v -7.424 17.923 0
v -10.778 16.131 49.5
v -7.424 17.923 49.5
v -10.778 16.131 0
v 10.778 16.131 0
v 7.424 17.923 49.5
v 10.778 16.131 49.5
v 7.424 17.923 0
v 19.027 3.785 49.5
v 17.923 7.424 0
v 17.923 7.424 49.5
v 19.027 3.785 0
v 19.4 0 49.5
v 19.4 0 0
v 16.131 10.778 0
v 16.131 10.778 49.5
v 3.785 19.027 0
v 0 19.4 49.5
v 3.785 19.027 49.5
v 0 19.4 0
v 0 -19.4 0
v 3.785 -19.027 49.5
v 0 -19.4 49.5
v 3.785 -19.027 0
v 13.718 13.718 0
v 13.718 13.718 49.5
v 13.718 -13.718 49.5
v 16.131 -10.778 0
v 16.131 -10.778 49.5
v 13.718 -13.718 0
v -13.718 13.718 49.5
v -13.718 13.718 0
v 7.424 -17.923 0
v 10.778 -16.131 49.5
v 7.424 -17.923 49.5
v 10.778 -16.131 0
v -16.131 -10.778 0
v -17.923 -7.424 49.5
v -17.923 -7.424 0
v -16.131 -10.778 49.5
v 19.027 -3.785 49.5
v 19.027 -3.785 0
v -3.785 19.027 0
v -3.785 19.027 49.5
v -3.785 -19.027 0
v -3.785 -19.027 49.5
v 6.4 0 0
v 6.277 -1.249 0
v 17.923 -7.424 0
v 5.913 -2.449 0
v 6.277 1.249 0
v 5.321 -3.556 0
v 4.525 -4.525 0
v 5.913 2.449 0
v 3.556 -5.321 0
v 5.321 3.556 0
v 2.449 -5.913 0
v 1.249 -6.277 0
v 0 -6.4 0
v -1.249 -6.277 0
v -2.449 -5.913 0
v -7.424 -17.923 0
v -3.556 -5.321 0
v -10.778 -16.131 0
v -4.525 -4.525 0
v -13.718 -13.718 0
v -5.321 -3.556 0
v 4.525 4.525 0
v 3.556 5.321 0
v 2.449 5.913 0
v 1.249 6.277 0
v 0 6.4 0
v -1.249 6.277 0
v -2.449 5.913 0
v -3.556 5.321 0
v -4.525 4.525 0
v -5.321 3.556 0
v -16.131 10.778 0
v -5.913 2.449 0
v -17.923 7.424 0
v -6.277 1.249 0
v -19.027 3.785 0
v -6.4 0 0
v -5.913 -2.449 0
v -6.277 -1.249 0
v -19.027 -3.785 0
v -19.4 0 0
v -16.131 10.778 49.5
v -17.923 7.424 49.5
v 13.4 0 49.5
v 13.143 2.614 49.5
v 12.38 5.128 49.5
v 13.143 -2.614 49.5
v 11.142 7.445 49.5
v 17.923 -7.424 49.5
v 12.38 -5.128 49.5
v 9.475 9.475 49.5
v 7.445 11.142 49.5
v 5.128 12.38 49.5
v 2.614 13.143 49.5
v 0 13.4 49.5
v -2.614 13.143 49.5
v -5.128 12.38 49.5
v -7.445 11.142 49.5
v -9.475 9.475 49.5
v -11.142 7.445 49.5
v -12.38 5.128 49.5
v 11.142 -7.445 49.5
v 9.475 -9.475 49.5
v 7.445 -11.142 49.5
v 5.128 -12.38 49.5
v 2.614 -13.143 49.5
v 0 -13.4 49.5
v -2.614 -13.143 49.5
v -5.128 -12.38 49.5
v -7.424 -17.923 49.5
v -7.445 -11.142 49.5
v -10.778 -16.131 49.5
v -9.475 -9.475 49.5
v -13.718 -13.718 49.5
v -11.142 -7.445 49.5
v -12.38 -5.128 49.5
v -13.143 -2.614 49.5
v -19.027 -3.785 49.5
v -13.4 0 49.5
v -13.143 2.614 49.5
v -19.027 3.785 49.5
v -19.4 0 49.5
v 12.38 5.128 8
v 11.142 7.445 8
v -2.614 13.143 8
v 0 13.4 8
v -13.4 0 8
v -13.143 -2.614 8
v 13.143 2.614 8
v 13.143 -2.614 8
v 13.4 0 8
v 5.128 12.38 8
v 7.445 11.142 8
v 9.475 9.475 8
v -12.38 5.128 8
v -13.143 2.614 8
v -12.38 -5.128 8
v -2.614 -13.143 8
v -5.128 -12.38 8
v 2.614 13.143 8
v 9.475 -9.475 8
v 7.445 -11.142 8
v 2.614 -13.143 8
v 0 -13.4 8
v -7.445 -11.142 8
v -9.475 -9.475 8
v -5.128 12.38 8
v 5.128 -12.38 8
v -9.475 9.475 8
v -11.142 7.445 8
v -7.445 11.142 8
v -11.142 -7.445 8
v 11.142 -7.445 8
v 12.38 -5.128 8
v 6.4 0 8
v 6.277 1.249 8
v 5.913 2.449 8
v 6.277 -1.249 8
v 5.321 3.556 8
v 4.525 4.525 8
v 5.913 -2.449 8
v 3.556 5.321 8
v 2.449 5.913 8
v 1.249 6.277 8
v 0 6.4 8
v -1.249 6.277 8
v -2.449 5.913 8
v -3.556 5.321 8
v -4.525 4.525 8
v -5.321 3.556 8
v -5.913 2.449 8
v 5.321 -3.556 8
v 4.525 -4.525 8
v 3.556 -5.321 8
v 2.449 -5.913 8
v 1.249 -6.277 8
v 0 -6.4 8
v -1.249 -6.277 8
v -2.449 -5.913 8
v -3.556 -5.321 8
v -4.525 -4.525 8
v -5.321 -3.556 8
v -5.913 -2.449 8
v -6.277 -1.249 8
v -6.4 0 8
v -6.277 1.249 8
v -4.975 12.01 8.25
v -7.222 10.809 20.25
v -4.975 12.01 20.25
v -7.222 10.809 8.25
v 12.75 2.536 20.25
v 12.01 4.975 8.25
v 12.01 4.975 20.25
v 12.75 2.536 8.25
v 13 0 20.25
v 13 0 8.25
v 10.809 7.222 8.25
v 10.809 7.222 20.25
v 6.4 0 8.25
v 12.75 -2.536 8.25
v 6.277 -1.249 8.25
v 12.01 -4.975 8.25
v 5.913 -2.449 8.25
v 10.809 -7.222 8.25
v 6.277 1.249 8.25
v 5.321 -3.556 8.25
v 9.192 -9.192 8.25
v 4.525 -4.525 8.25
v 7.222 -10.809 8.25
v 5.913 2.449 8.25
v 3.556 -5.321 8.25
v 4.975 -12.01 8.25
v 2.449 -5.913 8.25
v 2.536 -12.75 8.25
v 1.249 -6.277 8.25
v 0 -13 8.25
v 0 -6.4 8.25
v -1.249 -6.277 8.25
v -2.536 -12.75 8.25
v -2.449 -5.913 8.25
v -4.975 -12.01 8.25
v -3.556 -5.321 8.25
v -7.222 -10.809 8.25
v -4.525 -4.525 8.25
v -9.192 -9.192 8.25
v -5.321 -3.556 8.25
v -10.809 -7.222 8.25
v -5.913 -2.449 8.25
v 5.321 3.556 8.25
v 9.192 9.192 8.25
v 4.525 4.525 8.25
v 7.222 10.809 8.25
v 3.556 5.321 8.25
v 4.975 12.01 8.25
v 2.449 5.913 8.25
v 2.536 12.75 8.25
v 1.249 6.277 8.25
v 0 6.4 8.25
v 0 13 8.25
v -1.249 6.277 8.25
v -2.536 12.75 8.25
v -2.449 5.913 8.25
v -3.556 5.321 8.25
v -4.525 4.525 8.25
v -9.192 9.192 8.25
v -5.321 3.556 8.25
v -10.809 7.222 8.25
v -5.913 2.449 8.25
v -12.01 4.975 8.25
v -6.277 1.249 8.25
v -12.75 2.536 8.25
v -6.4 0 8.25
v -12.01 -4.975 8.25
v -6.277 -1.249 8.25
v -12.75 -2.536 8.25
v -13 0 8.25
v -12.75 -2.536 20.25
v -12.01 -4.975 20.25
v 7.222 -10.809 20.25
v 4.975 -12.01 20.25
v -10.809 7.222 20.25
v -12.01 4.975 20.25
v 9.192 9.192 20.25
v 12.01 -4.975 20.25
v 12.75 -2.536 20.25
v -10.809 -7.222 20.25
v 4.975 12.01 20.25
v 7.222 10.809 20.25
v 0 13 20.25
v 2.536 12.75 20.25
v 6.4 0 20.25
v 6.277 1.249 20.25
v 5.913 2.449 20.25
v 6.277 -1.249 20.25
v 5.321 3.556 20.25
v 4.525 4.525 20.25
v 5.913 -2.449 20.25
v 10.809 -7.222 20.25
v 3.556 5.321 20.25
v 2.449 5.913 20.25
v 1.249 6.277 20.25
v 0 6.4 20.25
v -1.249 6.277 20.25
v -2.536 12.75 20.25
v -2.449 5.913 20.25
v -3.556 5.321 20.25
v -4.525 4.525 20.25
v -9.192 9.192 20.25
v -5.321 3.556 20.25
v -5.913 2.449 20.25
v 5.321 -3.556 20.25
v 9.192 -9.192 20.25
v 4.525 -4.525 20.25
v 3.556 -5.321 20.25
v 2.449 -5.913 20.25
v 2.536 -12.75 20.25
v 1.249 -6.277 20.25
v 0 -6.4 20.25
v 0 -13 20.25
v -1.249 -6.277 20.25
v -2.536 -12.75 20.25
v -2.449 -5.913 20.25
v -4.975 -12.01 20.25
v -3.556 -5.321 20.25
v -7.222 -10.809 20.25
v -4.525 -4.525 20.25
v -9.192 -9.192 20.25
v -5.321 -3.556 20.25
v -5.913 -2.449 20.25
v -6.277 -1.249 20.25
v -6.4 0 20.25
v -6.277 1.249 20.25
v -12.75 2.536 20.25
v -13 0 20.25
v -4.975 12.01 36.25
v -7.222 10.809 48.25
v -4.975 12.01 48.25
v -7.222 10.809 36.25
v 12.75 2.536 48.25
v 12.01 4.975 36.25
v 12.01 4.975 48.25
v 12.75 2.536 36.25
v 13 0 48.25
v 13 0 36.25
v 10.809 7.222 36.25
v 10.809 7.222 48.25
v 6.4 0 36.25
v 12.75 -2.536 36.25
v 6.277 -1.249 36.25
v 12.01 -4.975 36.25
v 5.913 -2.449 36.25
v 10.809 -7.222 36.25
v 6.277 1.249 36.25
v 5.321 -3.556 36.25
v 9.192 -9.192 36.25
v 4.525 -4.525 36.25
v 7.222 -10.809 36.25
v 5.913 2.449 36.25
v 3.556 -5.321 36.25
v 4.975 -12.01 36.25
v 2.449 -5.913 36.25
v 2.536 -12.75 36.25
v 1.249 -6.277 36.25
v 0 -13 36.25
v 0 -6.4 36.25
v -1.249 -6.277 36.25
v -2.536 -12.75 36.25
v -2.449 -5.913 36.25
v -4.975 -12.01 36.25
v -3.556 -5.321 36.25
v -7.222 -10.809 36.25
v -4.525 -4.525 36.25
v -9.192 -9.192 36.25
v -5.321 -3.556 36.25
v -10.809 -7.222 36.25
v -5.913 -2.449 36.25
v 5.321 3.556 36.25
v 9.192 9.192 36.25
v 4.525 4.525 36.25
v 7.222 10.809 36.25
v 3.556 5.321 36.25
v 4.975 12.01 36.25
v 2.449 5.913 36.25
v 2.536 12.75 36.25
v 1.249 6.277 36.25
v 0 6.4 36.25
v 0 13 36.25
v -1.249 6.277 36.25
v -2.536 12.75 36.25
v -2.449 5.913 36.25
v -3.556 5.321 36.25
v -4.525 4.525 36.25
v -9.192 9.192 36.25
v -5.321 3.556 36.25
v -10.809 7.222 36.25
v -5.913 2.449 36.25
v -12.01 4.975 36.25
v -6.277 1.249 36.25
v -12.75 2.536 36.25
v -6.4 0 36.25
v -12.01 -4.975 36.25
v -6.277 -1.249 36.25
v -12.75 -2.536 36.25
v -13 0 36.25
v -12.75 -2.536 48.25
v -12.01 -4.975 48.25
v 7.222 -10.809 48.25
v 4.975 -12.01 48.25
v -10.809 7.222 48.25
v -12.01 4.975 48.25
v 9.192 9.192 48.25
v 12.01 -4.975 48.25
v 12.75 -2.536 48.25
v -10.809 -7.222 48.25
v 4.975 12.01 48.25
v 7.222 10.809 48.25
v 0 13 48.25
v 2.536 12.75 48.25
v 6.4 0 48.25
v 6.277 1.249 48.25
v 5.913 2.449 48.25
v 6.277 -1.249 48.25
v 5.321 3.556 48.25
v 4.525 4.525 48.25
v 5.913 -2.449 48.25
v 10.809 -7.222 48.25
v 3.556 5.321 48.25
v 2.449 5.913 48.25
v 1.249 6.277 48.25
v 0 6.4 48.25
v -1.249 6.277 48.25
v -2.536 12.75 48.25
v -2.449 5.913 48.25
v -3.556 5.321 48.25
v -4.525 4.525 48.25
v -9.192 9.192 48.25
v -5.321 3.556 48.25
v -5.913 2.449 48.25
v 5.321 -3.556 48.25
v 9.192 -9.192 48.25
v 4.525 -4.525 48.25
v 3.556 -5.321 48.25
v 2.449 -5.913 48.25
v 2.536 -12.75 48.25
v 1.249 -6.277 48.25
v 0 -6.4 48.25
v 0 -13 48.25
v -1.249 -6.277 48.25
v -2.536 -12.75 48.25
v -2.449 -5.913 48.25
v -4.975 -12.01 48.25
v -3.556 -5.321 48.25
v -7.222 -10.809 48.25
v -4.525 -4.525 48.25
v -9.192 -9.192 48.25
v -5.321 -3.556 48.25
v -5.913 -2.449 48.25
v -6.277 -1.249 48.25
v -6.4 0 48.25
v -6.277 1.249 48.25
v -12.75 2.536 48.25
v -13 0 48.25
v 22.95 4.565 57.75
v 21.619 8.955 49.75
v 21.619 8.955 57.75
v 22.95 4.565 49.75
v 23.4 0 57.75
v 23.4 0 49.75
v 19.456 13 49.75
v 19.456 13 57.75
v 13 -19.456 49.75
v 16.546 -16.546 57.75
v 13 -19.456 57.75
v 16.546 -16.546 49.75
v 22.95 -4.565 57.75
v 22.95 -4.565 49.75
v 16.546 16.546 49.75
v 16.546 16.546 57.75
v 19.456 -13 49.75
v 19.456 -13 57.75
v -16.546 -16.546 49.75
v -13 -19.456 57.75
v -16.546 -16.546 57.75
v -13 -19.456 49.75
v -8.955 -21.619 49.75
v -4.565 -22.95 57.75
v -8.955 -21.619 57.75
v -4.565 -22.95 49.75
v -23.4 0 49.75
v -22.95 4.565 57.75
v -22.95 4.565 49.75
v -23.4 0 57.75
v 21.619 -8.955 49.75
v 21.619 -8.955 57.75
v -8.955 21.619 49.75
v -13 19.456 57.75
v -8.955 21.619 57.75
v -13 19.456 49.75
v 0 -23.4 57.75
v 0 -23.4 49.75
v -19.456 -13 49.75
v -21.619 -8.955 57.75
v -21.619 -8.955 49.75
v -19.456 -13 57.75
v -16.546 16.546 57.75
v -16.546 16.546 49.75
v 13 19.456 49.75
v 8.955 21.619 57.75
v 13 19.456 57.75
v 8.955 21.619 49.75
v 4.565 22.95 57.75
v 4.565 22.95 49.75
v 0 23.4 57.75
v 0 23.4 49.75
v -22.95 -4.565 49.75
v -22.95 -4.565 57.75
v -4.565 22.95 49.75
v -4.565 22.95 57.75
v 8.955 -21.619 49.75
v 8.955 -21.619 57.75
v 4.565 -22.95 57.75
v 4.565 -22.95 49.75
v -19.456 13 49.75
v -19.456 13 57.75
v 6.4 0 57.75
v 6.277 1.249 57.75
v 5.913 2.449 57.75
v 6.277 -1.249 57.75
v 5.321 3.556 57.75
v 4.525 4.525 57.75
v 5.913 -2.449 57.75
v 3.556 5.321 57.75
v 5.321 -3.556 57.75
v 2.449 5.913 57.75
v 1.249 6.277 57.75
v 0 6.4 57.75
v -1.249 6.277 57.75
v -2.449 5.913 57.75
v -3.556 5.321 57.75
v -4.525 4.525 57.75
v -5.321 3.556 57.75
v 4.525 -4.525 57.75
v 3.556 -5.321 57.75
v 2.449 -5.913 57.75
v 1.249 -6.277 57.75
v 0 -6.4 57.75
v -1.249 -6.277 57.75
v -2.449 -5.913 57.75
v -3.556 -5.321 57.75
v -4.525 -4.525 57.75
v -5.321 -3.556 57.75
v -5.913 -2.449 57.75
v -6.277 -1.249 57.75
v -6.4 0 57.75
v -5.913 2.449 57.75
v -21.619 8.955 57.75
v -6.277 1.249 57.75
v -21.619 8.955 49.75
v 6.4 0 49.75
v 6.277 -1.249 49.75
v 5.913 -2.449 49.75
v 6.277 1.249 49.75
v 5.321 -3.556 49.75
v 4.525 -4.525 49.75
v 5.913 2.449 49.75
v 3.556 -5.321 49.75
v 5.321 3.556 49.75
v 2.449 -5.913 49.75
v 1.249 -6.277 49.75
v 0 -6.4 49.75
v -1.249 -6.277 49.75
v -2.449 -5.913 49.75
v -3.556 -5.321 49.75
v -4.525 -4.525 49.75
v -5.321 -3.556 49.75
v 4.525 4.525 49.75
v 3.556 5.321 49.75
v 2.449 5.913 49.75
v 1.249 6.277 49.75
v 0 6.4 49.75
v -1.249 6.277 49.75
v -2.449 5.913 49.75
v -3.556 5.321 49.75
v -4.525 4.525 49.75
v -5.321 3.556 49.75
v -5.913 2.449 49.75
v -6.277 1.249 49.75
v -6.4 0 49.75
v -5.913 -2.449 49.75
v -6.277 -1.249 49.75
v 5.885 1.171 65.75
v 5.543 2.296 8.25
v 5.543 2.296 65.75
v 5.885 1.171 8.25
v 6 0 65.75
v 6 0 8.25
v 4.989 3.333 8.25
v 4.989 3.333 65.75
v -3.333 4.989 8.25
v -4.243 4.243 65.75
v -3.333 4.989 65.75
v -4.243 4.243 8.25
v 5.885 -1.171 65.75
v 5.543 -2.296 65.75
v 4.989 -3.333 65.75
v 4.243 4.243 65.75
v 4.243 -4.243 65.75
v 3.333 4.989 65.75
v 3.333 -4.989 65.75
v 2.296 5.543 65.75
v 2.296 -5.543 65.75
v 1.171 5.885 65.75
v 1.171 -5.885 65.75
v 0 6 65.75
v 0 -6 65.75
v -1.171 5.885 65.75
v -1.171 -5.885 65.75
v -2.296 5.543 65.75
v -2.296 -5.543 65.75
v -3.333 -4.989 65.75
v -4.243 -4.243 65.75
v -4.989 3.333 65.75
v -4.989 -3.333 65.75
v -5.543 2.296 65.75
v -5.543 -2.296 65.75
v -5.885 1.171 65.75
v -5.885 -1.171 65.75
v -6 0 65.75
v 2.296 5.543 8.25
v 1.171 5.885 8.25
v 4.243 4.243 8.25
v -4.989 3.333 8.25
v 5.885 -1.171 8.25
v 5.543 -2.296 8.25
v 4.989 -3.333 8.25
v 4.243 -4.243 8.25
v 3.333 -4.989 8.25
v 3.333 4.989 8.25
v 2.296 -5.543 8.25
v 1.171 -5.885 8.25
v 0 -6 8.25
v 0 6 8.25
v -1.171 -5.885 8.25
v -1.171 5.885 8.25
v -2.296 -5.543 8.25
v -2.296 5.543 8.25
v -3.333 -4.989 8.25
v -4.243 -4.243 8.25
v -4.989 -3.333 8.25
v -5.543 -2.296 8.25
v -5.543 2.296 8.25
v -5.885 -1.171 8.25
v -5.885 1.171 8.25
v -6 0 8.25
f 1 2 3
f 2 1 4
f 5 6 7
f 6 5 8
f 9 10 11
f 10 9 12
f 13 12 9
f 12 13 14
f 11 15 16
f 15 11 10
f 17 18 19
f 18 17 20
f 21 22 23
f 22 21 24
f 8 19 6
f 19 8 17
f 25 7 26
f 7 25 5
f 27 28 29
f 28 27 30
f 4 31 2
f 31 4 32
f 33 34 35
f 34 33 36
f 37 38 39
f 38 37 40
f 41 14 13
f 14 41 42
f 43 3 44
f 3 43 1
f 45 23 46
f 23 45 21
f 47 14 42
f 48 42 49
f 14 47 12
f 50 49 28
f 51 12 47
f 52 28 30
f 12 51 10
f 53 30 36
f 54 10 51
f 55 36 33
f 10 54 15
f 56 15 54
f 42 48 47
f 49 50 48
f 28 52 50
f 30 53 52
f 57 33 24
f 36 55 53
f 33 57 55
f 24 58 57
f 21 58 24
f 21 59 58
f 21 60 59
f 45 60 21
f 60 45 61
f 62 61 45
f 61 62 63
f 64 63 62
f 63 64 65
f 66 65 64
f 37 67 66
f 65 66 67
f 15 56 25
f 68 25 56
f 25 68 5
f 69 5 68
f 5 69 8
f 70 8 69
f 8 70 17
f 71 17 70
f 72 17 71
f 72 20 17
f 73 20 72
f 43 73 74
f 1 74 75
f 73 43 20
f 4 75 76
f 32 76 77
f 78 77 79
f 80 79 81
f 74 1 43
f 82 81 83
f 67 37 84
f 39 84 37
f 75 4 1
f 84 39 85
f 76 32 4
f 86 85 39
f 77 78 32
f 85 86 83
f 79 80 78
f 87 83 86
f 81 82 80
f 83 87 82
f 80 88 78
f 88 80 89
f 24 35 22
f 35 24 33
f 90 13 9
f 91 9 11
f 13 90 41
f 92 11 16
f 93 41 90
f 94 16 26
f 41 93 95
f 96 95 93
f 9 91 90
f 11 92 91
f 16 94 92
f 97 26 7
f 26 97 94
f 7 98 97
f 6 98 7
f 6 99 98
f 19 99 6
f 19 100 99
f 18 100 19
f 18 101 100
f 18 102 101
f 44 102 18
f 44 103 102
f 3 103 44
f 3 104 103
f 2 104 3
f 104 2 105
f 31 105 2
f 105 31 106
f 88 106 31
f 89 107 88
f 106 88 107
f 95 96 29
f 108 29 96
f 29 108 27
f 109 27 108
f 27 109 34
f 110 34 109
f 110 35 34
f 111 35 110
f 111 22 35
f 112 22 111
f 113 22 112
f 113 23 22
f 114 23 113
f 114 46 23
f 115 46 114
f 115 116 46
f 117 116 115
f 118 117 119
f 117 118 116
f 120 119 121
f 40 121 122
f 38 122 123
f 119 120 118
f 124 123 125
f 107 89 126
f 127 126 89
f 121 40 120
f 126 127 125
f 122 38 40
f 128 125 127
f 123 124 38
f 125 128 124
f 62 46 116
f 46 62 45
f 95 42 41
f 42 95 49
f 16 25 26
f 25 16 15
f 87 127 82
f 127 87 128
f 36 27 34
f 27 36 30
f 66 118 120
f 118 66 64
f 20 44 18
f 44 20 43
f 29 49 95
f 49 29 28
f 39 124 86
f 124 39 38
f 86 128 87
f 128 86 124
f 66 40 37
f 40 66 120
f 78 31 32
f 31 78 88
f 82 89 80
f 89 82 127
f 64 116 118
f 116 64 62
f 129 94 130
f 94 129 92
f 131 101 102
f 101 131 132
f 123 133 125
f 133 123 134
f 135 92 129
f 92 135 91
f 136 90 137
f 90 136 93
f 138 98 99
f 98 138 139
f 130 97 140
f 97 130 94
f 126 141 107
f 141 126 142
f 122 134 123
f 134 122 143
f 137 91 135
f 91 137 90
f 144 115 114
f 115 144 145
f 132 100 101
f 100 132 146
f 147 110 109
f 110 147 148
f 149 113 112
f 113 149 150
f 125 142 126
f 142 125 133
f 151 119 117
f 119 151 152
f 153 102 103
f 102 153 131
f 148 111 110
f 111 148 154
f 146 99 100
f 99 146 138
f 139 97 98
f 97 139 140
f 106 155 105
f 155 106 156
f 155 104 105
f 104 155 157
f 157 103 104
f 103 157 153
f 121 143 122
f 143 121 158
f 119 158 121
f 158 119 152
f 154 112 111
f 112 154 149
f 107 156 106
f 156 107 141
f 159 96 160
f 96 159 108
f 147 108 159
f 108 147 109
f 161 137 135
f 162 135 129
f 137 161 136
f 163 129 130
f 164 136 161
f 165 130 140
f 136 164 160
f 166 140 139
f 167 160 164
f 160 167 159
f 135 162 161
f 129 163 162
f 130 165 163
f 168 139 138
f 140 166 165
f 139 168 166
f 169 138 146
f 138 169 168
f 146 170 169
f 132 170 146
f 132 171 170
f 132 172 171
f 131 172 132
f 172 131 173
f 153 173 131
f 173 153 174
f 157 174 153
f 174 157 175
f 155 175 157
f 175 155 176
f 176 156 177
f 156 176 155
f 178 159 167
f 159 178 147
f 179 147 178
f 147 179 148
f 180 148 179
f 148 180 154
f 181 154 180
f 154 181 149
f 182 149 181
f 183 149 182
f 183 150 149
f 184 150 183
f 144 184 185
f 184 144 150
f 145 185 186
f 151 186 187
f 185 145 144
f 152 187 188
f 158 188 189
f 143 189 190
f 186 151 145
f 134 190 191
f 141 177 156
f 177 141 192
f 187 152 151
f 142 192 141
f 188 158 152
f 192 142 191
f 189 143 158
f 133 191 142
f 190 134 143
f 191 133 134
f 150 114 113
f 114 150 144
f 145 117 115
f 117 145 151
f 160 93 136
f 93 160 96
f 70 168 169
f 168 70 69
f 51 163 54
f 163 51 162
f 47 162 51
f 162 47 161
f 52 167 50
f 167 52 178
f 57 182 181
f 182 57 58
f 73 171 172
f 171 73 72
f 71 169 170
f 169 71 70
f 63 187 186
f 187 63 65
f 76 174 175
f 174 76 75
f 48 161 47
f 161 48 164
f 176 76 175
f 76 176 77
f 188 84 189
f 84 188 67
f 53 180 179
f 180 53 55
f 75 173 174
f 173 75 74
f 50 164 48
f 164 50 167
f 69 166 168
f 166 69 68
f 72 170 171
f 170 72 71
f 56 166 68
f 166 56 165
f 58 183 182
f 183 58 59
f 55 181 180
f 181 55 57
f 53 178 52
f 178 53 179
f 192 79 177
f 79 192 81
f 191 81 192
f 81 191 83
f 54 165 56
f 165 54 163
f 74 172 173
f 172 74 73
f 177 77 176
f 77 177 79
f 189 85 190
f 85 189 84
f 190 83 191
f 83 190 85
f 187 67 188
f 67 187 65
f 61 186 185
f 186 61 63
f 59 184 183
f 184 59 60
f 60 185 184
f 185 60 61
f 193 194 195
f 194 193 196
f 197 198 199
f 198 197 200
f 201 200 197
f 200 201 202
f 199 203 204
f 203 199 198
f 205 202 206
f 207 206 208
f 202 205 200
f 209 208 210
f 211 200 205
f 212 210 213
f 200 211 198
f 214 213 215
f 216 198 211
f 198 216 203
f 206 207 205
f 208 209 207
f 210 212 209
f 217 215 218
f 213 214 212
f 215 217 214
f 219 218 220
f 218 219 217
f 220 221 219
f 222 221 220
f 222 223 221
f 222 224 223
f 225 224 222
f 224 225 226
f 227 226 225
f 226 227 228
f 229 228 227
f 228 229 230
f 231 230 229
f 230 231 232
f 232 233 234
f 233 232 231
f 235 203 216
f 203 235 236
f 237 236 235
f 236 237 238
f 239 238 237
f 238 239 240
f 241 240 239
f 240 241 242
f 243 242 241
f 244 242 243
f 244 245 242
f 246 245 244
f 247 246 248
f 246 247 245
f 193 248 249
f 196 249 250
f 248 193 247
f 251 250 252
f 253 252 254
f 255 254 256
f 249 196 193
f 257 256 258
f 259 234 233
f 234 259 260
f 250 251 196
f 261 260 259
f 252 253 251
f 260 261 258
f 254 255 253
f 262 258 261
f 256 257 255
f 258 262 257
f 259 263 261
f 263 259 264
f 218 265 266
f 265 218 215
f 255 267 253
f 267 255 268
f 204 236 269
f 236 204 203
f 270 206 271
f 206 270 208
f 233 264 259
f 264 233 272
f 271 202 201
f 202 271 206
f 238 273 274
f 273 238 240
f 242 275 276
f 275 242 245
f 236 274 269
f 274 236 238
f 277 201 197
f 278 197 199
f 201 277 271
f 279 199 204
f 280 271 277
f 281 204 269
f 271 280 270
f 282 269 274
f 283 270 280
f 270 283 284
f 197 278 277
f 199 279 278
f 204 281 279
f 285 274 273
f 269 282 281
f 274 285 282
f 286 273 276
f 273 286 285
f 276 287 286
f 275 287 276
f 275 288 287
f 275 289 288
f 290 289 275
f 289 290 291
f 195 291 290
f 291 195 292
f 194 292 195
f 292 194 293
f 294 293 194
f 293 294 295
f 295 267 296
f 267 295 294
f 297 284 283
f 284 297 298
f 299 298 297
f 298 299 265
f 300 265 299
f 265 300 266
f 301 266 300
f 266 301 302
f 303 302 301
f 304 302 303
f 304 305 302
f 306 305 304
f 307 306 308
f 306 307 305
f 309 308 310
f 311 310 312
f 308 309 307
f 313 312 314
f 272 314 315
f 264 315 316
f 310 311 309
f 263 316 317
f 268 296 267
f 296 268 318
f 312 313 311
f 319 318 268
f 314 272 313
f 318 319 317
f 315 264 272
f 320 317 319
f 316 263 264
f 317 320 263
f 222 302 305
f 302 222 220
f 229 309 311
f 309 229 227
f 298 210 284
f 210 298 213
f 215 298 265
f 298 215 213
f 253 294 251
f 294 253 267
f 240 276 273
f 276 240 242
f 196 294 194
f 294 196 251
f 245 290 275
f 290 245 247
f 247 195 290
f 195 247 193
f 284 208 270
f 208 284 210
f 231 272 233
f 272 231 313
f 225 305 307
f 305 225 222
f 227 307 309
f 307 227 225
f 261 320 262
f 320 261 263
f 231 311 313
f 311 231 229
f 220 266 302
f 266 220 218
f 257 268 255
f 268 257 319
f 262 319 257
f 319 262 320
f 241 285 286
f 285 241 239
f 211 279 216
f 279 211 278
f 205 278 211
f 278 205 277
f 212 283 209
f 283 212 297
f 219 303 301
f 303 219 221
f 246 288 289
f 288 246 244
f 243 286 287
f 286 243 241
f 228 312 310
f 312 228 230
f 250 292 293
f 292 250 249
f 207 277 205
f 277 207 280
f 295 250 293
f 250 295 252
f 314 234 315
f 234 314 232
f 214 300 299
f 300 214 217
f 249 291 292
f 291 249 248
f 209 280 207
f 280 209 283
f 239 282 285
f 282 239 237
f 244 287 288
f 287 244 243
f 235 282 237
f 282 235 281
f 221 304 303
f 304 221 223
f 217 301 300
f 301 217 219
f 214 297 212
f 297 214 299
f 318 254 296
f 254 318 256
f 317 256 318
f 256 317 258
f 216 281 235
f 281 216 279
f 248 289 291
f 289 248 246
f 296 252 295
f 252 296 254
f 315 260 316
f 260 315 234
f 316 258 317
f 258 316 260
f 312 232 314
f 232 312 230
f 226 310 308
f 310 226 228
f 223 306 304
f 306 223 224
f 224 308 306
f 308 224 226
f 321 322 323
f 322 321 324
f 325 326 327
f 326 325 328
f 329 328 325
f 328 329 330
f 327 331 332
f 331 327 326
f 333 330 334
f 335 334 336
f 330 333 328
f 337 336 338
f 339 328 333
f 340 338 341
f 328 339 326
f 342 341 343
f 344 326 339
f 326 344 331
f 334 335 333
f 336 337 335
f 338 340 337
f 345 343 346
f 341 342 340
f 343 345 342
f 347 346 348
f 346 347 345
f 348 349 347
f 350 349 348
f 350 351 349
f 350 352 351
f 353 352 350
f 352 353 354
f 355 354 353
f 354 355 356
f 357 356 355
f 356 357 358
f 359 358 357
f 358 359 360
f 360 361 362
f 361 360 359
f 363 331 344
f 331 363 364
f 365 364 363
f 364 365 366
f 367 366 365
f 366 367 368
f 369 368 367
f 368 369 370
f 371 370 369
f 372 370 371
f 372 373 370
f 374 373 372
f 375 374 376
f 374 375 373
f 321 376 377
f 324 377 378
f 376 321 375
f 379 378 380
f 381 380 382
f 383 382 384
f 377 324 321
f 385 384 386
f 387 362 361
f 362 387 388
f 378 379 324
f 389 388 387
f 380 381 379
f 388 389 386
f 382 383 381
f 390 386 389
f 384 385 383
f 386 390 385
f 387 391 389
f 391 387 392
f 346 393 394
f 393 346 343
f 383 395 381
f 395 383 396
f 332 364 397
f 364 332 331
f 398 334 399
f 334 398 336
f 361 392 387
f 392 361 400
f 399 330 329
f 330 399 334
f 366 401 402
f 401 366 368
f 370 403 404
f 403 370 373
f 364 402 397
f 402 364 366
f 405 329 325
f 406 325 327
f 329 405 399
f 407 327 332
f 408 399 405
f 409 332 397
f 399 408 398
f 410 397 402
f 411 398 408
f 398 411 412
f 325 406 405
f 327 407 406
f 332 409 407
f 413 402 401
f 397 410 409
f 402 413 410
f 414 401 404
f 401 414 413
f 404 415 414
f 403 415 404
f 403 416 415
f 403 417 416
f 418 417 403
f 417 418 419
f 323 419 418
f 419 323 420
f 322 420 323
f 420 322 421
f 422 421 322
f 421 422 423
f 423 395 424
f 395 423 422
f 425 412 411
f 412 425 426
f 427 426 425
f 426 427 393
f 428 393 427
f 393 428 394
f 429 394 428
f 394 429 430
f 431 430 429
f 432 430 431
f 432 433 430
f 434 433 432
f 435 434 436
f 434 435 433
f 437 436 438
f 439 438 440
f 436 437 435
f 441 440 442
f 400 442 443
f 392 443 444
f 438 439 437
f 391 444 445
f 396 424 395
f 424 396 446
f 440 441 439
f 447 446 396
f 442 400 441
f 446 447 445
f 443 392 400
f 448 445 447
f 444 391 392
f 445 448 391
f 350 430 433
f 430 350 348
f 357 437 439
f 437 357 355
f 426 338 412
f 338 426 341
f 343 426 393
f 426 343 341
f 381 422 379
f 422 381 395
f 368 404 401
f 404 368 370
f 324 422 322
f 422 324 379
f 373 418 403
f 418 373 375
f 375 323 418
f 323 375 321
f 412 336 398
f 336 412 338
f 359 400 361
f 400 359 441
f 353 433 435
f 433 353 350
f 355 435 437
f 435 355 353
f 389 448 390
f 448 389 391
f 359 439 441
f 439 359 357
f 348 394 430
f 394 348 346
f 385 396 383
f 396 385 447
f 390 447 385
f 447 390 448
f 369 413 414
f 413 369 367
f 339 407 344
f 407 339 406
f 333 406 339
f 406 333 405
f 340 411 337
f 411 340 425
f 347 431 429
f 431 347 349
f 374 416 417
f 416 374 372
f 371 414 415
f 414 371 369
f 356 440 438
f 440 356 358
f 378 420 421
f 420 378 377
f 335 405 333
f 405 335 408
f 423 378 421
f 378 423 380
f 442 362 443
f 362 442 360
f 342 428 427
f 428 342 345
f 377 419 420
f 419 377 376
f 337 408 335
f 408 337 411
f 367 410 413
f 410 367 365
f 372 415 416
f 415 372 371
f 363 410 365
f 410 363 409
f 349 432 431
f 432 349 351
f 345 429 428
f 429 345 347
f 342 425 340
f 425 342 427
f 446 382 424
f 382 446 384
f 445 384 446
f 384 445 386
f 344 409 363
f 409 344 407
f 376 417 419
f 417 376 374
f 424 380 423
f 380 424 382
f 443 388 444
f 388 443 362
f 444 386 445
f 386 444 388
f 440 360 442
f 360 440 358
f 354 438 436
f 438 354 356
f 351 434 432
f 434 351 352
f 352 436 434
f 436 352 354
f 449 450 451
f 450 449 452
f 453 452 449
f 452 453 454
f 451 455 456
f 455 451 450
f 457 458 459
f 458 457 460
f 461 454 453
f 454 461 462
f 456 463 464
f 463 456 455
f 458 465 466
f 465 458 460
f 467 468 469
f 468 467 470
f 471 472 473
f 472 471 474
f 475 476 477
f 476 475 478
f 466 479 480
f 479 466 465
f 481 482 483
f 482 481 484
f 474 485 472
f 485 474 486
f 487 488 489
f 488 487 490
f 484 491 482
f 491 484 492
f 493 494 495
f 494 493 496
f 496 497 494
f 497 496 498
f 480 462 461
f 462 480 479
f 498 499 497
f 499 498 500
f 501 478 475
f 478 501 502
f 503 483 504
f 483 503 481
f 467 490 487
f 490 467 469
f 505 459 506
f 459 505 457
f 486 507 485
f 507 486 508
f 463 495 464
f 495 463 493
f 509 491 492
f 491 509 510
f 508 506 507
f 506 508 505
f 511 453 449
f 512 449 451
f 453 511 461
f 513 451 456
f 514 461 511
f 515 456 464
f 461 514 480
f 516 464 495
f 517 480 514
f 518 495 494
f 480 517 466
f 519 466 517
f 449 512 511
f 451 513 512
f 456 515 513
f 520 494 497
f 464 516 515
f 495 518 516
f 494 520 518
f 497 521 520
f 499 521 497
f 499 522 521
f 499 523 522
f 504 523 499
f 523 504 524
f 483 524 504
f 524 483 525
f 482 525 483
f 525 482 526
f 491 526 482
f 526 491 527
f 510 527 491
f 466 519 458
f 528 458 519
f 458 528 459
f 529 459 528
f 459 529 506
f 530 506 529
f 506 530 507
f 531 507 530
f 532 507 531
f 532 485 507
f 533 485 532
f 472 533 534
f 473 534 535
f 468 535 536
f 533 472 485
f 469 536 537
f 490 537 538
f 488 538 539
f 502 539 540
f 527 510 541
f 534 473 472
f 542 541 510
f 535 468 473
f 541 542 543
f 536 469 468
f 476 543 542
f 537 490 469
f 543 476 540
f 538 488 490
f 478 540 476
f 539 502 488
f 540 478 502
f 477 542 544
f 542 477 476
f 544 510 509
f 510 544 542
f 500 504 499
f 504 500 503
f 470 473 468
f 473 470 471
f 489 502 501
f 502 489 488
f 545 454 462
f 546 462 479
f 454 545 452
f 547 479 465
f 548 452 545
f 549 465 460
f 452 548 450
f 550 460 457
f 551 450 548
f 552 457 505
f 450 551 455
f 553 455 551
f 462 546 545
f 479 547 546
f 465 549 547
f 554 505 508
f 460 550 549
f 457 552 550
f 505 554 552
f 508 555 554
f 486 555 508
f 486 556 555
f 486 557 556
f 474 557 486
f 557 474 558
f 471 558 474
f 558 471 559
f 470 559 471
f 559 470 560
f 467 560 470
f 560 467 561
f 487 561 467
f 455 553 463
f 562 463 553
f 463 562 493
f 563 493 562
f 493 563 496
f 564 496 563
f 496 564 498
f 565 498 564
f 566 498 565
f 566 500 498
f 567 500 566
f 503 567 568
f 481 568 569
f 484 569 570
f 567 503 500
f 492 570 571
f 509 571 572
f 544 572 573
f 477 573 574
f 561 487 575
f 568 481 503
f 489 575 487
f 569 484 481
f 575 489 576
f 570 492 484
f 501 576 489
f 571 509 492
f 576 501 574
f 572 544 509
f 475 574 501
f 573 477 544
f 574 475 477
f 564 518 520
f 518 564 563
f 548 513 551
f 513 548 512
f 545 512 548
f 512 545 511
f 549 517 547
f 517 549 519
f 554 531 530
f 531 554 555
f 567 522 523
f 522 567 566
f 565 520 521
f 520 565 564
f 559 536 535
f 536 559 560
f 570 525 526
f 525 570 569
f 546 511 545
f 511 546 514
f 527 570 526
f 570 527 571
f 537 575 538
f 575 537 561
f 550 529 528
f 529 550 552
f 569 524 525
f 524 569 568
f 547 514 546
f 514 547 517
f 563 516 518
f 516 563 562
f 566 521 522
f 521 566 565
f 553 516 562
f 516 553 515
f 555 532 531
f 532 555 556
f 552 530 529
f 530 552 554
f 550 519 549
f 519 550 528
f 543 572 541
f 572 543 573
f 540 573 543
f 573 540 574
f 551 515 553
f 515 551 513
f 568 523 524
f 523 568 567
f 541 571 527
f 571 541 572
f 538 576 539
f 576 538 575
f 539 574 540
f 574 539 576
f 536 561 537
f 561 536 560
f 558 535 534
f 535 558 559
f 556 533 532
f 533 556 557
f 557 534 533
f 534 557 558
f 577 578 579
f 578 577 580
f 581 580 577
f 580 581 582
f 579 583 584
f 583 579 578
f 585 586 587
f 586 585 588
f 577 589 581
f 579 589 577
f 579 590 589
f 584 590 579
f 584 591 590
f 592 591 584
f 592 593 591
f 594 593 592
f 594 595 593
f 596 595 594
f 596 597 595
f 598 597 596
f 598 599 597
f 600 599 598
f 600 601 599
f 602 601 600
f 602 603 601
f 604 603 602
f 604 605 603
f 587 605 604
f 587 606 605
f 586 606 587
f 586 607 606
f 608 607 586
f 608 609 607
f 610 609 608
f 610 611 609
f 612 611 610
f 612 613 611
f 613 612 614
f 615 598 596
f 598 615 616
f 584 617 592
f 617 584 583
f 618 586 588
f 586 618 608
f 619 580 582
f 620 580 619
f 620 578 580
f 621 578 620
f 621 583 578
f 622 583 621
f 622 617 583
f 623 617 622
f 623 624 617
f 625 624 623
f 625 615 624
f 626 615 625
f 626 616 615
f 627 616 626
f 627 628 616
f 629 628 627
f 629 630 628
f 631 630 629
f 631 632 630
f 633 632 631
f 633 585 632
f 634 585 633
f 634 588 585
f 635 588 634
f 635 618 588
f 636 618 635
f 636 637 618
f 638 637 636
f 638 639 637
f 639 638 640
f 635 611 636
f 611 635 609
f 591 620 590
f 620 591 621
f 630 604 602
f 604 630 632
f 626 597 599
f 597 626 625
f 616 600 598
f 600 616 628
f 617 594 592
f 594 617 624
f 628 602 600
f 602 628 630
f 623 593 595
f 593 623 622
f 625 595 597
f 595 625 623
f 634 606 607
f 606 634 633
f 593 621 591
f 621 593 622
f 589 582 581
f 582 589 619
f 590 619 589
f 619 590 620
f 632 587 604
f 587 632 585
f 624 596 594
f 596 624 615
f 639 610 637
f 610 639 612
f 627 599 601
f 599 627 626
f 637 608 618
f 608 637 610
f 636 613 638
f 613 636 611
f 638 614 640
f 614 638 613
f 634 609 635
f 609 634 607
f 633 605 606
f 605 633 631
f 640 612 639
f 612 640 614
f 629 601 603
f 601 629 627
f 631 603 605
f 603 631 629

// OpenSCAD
$fn = 32;

// ------------------------------------------------------------------------
// Shaft station: cup d38.8 x 49.5 mm, shaft d12
// Every part is its own module, assembly() places every instance.
// ------------------------------------------------------------------------

// --- part 1 ---
module housing_cup() {
  difference() {
    cylinder(h = 49.5, d = 38.8);
    translate([0, 0, 8]) cylinder(h = 42.5, d = 26.8);
    translate([0, 0, -1]) cylinder(h = 10, d = 12.8);
  }
}

// --- part 2 ---
module bearing_lower() {
  difference() {
      translate([0, 0, 0]) cylinder(h = 12, d = 26);
      translate([0, 0, -1]) cylinder(h = 14, d = 12.8);
    }
}

// --- part 3 ---
module bearing_upper() {
  difference() {
      translate([0, 0, 0]) cylinder(h = 12, d = 26);
      translate([0, 0, -1]) cylinder(h = 14, d = 12.8);
    }
}

// --- part 4 ---
module station_shaft() {
  translate([0, 0, -28.75]) cylinder(h = 57.5, d = 12);
}

// --- part 5 ---
module station_cover() {
  difference() {
    cylinder(h = 8, d = 46.8);
    translate([0, 0, -1]) cylinder(h = 10, d = 12.8);
  }
}

// --- assembly ---
module assembly() {
  color([0.80, 0.24, 0.20]) translate([0, 0, 0]) rotate([0, 0, 0]) housing_cup();
  color([0.20, 0.45, 0.75]) translate([0, 0, 8.25]) rotate([0, 0, 0]) bearing_lower();
  color([0.25, 0.62, 0.32]) translate([0, 0, 36.25]) rotate([0, 0, 0]) bearing_upper();
  color([0.92, 0.70, 0.18]) translate([0, 0, 37]) rotate([0, 0, 0]) station_shaft();
  color([0.58, 0.35, 0.70]) translate([0, 0, 49.75]) rotate([0, 0, 0]) station_cover();
}

assembly();
